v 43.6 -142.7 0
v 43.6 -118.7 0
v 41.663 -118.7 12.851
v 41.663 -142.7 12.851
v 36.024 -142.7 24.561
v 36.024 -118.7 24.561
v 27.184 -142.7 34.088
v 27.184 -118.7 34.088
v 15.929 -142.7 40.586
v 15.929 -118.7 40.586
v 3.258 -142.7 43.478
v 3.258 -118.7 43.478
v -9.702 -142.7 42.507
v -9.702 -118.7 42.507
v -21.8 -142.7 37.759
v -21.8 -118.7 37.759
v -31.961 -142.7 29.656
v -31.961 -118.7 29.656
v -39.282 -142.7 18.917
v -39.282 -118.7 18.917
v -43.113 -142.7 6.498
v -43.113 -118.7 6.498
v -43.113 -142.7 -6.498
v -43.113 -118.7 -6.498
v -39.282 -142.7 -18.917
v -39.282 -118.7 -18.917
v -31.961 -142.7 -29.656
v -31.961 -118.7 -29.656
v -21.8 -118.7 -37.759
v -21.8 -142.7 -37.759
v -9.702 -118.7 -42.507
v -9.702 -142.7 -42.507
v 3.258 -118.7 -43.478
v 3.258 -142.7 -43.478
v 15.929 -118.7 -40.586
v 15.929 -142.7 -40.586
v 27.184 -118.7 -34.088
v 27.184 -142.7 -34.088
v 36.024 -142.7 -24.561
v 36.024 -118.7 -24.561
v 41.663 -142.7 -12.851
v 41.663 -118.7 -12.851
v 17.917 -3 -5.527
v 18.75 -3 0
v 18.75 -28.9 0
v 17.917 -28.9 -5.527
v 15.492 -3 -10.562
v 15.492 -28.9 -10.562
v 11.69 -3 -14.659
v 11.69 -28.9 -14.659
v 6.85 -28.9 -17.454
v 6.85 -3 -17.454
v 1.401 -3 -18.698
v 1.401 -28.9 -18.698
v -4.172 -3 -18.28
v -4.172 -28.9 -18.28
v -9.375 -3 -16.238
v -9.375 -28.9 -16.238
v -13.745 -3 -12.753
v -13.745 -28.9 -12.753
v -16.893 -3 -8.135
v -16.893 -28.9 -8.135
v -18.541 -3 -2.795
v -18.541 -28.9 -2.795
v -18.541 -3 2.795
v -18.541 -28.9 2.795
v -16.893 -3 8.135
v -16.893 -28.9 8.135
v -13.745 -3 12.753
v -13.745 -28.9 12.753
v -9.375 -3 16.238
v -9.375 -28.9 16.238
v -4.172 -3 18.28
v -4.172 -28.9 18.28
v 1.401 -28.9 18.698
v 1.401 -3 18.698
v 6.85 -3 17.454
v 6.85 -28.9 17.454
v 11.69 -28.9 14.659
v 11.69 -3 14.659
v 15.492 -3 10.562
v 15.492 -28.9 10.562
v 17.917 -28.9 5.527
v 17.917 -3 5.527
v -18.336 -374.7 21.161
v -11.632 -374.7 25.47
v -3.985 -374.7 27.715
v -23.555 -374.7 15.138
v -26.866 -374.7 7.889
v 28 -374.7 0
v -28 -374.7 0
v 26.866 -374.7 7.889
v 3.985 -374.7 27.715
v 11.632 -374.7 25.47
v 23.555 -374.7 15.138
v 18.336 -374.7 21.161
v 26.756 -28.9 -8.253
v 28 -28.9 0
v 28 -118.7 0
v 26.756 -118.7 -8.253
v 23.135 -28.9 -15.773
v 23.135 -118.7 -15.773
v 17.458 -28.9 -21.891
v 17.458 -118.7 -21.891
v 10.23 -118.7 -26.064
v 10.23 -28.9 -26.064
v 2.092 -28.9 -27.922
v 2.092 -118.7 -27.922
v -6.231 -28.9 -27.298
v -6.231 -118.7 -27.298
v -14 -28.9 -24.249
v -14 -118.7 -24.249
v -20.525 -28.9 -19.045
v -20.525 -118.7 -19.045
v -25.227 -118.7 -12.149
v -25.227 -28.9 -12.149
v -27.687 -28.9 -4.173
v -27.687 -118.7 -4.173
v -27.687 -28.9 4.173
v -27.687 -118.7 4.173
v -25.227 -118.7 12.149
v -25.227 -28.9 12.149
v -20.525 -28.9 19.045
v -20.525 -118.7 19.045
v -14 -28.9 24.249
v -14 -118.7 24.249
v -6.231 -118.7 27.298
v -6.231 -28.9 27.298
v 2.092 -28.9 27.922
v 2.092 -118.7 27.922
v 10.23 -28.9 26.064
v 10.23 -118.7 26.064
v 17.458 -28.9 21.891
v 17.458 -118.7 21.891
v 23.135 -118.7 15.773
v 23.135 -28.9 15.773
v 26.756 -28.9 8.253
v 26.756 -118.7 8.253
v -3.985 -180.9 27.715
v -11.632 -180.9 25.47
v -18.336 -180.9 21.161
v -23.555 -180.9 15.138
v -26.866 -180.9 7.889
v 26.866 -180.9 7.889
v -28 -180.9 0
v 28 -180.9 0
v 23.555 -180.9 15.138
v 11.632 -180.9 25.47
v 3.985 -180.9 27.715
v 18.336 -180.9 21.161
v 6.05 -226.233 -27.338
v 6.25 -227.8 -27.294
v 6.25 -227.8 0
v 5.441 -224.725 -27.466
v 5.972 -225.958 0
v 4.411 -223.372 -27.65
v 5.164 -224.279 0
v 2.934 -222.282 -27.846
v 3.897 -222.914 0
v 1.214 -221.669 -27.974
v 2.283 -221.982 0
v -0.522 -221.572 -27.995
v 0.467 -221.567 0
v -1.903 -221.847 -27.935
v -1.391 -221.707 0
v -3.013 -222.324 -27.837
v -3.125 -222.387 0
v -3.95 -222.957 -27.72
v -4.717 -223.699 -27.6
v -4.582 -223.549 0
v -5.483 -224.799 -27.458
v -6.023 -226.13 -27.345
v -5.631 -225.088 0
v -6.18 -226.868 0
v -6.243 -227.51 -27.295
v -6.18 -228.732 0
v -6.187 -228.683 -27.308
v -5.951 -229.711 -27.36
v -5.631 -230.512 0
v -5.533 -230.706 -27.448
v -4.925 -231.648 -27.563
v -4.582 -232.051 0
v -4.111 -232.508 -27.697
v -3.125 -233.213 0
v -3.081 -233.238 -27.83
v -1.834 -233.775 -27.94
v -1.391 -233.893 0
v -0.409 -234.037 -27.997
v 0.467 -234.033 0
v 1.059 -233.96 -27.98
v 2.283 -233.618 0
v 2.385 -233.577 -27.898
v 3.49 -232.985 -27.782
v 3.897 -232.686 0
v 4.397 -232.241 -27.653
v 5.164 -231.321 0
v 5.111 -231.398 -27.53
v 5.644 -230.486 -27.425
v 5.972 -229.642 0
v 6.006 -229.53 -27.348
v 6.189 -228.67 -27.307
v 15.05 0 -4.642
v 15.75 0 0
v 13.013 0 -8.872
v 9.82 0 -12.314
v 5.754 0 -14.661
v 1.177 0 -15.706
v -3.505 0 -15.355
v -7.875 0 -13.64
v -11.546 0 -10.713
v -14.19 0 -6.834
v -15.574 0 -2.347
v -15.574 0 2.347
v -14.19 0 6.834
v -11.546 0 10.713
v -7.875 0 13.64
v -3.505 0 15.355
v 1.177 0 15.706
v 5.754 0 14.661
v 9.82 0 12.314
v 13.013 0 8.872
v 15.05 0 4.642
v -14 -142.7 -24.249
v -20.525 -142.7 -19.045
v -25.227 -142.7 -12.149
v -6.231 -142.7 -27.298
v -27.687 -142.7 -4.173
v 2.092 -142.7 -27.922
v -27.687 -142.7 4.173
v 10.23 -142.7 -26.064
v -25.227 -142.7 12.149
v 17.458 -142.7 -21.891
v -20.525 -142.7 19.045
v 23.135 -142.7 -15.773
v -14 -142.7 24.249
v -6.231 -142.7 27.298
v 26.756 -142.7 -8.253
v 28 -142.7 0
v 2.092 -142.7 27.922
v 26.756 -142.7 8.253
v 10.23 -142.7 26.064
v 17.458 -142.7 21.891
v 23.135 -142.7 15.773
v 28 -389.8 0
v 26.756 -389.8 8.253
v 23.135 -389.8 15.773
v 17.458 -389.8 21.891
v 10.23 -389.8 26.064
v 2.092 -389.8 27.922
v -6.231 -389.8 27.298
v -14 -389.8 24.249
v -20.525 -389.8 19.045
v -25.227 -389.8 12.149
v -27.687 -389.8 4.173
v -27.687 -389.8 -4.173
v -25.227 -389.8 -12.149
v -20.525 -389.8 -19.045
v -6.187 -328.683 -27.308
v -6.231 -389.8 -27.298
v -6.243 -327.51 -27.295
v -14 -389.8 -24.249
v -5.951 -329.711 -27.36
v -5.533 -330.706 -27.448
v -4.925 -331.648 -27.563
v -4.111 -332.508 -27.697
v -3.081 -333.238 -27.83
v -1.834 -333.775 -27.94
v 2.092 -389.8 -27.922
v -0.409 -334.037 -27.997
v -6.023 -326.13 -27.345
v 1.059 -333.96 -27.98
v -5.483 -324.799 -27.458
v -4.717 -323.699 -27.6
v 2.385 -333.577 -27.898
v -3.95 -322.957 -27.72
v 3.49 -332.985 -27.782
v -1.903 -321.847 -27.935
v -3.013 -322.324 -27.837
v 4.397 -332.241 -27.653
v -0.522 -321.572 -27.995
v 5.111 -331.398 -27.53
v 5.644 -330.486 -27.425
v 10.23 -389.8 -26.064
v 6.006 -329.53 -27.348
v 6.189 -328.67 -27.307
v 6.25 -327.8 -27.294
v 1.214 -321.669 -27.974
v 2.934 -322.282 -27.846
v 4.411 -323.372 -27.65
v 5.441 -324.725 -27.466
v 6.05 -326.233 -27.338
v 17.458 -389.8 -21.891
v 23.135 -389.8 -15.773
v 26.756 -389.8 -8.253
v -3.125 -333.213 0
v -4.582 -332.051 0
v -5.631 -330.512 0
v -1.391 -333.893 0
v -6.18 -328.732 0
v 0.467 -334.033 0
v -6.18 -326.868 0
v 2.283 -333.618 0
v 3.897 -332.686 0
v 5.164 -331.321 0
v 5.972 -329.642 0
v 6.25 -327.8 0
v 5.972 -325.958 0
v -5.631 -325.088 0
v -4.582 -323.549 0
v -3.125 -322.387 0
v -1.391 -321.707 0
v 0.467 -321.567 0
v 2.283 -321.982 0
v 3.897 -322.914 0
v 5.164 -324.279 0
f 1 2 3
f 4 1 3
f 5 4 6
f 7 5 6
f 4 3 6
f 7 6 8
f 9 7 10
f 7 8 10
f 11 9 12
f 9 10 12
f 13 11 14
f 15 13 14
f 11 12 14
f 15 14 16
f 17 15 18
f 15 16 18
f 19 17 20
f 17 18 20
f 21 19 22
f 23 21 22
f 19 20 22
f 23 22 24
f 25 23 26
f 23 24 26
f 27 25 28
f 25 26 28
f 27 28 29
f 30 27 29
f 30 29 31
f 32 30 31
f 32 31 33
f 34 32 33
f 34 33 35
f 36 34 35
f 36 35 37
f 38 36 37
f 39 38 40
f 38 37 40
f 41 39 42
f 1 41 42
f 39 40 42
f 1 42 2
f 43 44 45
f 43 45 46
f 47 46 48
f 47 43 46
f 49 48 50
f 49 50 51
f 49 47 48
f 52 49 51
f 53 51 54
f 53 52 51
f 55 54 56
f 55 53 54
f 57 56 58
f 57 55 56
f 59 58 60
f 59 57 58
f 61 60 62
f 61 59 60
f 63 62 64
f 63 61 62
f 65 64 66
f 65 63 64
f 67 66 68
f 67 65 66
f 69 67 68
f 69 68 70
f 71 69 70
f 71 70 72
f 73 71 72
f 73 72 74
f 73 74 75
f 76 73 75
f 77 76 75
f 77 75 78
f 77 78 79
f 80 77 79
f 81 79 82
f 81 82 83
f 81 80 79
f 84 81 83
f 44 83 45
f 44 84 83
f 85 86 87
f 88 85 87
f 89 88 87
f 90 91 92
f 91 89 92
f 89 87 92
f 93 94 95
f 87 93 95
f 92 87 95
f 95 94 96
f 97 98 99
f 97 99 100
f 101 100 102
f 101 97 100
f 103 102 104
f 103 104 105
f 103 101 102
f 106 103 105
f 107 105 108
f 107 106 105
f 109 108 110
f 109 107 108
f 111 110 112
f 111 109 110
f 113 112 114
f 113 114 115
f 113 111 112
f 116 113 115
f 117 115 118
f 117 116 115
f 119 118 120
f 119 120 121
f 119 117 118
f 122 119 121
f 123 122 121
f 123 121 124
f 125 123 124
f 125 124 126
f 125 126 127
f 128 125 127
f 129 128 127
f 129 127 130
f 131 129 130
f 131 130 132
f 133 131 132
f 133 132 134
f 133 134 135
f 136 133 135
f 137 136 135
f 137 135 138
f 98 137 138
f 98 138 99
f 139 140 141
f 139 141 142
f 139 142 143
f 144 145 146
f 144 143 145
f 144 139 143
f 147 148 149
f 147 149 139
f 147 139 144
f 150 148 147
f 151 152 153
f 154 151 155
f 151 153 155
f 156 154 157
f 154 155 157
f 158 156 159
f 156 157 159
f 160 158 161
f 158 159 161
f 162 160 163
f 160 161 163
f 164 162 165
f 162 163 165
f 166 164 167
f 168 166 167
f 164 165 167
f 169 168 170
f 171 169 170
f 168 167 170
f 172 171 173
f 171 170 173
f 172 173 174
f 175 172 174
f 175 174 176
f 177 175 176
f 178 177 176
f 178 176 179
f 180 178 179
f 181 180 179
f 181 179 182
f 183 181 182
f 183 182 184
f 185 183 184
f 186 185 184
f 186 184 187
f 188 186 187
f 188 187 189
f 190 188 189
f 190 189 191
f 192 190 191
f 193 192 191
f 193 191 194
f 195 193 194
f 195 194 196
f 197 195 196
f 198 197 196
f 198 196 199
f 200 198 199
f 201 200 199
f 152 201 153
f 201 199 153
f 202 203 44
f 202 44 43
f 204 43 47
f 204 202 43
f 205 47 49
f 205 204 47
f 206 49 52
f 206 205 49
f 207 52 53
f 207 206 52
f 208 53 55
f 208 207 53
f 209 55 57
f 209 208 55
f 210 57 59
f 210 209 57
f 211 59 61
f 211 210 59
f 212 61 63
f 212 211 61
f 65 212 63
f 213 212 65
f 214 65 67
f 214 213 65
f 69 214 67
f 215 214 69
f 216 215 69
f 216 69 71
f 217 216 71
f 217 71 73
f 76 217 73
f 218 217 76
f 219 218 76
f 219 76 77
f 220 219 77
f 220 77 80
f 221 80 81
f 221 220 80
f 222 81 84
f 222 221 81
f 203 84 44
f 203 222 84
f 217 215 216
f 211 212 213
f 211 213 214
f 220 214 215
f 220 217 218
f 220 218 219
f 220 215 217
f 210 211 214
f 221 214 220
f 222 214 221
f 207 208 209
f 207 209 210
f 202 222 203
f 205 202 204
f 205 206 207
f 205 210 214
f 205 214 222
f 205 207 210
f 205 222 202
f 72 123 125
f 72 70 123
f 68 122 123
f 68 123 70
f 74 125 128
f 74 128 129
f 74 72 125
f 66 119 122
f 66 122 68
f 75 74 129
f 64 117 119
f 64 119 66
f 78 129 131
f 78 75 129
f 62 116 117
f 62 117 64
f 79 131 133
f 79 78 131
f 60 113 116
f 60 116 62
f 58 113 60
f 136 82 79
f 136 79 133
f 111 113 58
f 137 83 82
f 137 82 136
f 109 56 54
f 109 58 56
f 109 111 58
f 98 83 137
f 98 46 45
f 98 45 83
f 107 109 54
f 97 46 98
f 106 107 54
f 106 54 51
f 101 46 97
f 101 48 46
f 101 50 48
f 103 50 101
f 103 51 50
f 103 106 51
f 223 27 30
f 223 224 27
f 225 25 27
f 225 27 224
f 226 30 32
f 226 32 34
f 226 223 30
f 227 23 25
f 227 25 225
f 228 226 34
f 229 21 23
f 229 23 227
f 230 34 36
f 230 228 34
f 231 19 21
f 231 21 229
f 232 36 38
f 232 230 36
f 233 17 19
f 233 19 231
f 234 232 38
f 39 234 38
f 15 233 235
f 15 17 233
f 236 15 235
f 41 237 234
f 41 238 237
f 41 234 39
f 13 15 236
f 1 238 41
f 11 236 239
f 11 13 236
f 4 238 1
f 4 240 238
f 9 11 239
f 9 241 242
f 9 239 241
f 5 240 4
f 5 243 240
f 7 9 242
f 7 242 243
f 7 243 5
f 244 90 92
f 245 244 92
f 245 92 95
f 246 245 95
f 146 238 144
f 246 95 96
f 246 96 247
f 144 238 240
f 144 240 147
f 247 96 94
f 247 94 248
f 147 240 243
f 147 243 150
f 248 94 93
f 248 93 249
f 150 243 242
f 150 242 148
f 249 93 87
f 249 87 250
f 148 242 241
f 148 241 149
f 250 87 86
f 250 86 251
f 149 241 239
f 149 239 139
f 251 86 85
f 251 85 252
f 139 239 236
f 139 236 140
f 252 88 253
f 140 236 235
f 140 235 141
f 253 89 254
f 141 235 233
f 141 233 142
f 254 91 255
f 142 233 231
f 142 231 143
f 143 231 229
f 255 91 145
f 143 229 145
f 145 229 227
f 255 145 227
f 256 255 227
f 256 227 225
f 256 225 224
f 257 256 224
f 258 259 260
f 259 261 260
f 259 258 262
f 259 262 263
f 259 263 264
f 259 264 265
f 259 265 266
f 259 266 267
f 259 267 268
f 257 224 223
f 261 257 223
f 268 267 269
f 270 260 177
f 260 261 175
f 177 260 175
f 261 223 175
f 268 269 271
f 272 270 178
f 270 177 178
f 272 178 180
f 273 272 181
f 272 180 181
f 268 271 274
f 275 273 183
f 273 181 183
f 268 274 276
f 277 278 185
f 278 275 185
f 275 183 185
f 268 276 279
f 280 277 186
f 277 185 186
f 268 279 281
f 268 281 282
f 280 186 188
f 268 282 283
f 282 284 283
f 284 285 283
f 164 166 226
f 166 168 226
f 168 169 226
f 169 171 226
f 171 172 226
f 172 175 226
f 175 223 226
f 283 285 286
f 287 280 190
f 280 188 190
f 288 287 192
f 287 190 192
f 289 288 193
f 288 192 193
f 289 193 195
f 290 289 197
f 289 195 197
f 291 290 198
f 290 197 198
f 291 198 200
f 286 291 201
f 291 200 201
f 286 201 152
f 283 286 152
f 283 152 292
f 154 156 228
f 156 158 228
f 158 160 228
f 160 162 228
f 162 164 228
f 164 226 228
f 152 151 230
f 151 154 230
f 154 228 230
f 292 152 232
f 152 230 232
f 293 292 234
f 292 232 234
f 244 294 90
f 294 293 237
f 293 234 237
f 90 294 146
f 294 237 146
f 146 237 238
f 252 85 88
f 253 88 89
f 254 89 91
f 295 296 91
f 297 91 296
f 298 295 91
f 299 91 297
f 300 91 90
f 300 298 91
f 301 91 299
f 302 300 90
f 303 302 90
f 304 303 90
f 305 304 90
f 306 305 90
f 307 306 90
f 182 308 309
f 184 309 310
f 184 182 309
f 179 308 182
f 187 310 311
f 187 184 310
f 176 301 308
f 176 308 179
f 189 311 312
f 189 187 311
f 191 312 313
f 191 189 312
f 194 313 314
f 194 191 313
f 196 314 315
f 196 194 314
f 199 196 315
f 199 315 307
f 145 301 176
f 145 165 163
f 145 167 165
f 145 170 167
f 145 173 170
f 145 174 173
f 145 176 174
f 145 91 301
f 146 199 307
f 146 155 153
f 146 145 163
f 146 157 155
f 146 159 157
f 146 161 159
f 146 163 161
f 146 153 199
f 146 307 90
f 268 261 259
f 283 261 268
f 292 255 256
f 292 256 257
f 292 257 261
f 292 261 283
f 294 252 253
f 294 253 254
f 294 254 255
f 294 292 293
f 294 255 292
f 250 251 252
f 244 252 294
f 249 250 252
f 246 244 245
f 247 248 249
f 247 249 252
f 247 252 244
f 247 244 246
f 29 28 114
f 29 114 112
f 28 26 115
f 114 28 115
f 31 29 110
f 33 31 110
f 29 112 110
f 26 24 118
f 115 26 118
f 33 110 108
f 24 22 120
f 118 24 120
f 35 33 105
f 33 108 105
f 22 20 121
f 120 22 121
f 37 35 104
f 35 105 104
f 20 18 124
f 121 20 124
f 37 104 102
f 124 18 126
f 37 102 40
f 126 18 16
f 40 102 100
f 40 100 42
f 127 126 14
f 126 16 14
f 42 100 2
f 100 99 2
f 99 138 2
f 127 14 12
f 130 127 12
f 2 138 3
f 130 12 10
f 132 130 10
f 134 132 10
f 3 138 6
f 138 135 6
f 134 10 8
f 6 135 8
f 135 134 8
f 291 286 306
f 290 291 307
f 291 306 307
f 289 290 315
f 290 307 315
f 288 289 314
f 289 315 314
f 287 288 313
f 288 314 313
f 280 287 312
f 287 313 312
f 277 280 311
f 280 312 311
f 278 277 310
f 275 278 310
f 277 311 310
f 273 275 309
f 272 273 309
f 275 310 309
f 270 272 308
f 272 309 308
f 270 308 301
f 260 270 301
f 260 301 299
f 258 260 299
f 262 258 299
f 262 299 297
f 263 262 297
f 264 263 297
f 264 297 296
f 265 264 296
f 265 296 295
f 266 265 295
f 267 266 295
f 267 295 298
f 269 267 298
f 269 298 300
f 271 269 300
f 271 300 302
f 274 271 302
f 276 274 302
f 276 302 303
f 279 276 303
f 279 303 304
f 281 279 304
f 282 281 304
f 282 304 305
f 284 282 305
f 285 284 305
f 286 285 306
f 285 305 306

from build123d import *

# Parameters (mm, degrees)
SKETCH1_R           = 28
BOSS_EXTRUDE1_DEPTH = 118.7
SKETCH3_R           = 43.6
BOSS_EXTRUDE2_DEPTH = 24
SKETCH4_R           = 28
SKETCH4_R_2         = 18.75
CUT_EXTRUDE1_DEPTH  = 28.9
CHAMFER1_SIZE       = 3
SKETCH6_R           = 28
BOSS_EXTRUDE3_DEPTH = 38.2
BOSS_EXTRUDE4_DEPTH = 193.8
SKETCH9_R           = 28
BOSS_EXTRUDE5_DEPTH = 15.1
SKETCH10_R          = 6.25
CUT_EXTRUDE2_DEPTH  = 28.1


with BuildPart() as part:
    # Sketch1 → Boss-Extrude1 (new body)
    with BuildSketch(Plane(origin=(0, 0, 0), x_dir=(1, 0, 0), z_dir=(0, 1, 0))):
        Circle(SKETCH1_R)
    extrude(amount=-BOSS_EXTRUDE1_DEPTH)

    # Sketch3 → Boss-Extrude2 (add)
    with BuildSketch(Plane.XZ.offset(118.7)):
        Circle(SKETCH3_R)
    extrude(amount=BOSS_EXTRUDE2_DEPTH)

    # Sketch4 → Cut-Extrude1 (cut)
    with BuildSketch(Plane(origin=(0, 0, 0), x_dir=(1, 0, 0), z_dir=(0, 1, 0))):
        Circle(SKETCH4_R)
        Circle(SKETCH4_R_2, mode=Mode.SUBTRACT)
    extrude(amount=-CUT_EXTRUDE1_DEPTH, mode=Mode.SUBTRACT)

    # Chamfer1
    chamfer1_edges = [part.edges().sort_by_distance(p)[0] for p in [
        (-18.75, 0, 0),
    ]]
    chamfer(chamfer1_edges, length=CHAMFER1_SIZE)

    # Sketch6 → Boss-Extrude3 (add)
    with BuildSketch(Plane.XZ.offset(142.7)):
        Circle(SKETCH6_R)
    extrude(amount=BOSS_EXTRUDE3_DEPTH)

    # Sketch8 → Boss-Extrude4 (add)
    with BuildSketch(Plane.XZ.offset(180.9)):
        with BuildLine():
            Line((-28, 0), (28, 0))
            ThreePointArc((28, 0), (0, -28), (-28, 0))
        make_face()
    extrude(amount=BOSS_EXTRUDE4_DEPTH)

    # Sketch9 → Boss-Extrude5 (add)
    with BuildSketch(Plane.XZ.offset(374.7)):
        Circle(SKETCH9_R)
    extrude(amount=BOSS_EXTRUDE5_DEPTH)

    # Sketch10 → Cut-Extrude2 (cut)
    with BuildSketch(Plane.XY):
        with Locations((0, -227.8)):
            Circle(SKETCH10_R)
        with Locations((0, -327.8)):
            Circle(SKETCH10_R)
    extrude(amount=-CUT_EXTRUDE2_DEPTH, mode=Mode.SUBTRACT)


solid = part.part
